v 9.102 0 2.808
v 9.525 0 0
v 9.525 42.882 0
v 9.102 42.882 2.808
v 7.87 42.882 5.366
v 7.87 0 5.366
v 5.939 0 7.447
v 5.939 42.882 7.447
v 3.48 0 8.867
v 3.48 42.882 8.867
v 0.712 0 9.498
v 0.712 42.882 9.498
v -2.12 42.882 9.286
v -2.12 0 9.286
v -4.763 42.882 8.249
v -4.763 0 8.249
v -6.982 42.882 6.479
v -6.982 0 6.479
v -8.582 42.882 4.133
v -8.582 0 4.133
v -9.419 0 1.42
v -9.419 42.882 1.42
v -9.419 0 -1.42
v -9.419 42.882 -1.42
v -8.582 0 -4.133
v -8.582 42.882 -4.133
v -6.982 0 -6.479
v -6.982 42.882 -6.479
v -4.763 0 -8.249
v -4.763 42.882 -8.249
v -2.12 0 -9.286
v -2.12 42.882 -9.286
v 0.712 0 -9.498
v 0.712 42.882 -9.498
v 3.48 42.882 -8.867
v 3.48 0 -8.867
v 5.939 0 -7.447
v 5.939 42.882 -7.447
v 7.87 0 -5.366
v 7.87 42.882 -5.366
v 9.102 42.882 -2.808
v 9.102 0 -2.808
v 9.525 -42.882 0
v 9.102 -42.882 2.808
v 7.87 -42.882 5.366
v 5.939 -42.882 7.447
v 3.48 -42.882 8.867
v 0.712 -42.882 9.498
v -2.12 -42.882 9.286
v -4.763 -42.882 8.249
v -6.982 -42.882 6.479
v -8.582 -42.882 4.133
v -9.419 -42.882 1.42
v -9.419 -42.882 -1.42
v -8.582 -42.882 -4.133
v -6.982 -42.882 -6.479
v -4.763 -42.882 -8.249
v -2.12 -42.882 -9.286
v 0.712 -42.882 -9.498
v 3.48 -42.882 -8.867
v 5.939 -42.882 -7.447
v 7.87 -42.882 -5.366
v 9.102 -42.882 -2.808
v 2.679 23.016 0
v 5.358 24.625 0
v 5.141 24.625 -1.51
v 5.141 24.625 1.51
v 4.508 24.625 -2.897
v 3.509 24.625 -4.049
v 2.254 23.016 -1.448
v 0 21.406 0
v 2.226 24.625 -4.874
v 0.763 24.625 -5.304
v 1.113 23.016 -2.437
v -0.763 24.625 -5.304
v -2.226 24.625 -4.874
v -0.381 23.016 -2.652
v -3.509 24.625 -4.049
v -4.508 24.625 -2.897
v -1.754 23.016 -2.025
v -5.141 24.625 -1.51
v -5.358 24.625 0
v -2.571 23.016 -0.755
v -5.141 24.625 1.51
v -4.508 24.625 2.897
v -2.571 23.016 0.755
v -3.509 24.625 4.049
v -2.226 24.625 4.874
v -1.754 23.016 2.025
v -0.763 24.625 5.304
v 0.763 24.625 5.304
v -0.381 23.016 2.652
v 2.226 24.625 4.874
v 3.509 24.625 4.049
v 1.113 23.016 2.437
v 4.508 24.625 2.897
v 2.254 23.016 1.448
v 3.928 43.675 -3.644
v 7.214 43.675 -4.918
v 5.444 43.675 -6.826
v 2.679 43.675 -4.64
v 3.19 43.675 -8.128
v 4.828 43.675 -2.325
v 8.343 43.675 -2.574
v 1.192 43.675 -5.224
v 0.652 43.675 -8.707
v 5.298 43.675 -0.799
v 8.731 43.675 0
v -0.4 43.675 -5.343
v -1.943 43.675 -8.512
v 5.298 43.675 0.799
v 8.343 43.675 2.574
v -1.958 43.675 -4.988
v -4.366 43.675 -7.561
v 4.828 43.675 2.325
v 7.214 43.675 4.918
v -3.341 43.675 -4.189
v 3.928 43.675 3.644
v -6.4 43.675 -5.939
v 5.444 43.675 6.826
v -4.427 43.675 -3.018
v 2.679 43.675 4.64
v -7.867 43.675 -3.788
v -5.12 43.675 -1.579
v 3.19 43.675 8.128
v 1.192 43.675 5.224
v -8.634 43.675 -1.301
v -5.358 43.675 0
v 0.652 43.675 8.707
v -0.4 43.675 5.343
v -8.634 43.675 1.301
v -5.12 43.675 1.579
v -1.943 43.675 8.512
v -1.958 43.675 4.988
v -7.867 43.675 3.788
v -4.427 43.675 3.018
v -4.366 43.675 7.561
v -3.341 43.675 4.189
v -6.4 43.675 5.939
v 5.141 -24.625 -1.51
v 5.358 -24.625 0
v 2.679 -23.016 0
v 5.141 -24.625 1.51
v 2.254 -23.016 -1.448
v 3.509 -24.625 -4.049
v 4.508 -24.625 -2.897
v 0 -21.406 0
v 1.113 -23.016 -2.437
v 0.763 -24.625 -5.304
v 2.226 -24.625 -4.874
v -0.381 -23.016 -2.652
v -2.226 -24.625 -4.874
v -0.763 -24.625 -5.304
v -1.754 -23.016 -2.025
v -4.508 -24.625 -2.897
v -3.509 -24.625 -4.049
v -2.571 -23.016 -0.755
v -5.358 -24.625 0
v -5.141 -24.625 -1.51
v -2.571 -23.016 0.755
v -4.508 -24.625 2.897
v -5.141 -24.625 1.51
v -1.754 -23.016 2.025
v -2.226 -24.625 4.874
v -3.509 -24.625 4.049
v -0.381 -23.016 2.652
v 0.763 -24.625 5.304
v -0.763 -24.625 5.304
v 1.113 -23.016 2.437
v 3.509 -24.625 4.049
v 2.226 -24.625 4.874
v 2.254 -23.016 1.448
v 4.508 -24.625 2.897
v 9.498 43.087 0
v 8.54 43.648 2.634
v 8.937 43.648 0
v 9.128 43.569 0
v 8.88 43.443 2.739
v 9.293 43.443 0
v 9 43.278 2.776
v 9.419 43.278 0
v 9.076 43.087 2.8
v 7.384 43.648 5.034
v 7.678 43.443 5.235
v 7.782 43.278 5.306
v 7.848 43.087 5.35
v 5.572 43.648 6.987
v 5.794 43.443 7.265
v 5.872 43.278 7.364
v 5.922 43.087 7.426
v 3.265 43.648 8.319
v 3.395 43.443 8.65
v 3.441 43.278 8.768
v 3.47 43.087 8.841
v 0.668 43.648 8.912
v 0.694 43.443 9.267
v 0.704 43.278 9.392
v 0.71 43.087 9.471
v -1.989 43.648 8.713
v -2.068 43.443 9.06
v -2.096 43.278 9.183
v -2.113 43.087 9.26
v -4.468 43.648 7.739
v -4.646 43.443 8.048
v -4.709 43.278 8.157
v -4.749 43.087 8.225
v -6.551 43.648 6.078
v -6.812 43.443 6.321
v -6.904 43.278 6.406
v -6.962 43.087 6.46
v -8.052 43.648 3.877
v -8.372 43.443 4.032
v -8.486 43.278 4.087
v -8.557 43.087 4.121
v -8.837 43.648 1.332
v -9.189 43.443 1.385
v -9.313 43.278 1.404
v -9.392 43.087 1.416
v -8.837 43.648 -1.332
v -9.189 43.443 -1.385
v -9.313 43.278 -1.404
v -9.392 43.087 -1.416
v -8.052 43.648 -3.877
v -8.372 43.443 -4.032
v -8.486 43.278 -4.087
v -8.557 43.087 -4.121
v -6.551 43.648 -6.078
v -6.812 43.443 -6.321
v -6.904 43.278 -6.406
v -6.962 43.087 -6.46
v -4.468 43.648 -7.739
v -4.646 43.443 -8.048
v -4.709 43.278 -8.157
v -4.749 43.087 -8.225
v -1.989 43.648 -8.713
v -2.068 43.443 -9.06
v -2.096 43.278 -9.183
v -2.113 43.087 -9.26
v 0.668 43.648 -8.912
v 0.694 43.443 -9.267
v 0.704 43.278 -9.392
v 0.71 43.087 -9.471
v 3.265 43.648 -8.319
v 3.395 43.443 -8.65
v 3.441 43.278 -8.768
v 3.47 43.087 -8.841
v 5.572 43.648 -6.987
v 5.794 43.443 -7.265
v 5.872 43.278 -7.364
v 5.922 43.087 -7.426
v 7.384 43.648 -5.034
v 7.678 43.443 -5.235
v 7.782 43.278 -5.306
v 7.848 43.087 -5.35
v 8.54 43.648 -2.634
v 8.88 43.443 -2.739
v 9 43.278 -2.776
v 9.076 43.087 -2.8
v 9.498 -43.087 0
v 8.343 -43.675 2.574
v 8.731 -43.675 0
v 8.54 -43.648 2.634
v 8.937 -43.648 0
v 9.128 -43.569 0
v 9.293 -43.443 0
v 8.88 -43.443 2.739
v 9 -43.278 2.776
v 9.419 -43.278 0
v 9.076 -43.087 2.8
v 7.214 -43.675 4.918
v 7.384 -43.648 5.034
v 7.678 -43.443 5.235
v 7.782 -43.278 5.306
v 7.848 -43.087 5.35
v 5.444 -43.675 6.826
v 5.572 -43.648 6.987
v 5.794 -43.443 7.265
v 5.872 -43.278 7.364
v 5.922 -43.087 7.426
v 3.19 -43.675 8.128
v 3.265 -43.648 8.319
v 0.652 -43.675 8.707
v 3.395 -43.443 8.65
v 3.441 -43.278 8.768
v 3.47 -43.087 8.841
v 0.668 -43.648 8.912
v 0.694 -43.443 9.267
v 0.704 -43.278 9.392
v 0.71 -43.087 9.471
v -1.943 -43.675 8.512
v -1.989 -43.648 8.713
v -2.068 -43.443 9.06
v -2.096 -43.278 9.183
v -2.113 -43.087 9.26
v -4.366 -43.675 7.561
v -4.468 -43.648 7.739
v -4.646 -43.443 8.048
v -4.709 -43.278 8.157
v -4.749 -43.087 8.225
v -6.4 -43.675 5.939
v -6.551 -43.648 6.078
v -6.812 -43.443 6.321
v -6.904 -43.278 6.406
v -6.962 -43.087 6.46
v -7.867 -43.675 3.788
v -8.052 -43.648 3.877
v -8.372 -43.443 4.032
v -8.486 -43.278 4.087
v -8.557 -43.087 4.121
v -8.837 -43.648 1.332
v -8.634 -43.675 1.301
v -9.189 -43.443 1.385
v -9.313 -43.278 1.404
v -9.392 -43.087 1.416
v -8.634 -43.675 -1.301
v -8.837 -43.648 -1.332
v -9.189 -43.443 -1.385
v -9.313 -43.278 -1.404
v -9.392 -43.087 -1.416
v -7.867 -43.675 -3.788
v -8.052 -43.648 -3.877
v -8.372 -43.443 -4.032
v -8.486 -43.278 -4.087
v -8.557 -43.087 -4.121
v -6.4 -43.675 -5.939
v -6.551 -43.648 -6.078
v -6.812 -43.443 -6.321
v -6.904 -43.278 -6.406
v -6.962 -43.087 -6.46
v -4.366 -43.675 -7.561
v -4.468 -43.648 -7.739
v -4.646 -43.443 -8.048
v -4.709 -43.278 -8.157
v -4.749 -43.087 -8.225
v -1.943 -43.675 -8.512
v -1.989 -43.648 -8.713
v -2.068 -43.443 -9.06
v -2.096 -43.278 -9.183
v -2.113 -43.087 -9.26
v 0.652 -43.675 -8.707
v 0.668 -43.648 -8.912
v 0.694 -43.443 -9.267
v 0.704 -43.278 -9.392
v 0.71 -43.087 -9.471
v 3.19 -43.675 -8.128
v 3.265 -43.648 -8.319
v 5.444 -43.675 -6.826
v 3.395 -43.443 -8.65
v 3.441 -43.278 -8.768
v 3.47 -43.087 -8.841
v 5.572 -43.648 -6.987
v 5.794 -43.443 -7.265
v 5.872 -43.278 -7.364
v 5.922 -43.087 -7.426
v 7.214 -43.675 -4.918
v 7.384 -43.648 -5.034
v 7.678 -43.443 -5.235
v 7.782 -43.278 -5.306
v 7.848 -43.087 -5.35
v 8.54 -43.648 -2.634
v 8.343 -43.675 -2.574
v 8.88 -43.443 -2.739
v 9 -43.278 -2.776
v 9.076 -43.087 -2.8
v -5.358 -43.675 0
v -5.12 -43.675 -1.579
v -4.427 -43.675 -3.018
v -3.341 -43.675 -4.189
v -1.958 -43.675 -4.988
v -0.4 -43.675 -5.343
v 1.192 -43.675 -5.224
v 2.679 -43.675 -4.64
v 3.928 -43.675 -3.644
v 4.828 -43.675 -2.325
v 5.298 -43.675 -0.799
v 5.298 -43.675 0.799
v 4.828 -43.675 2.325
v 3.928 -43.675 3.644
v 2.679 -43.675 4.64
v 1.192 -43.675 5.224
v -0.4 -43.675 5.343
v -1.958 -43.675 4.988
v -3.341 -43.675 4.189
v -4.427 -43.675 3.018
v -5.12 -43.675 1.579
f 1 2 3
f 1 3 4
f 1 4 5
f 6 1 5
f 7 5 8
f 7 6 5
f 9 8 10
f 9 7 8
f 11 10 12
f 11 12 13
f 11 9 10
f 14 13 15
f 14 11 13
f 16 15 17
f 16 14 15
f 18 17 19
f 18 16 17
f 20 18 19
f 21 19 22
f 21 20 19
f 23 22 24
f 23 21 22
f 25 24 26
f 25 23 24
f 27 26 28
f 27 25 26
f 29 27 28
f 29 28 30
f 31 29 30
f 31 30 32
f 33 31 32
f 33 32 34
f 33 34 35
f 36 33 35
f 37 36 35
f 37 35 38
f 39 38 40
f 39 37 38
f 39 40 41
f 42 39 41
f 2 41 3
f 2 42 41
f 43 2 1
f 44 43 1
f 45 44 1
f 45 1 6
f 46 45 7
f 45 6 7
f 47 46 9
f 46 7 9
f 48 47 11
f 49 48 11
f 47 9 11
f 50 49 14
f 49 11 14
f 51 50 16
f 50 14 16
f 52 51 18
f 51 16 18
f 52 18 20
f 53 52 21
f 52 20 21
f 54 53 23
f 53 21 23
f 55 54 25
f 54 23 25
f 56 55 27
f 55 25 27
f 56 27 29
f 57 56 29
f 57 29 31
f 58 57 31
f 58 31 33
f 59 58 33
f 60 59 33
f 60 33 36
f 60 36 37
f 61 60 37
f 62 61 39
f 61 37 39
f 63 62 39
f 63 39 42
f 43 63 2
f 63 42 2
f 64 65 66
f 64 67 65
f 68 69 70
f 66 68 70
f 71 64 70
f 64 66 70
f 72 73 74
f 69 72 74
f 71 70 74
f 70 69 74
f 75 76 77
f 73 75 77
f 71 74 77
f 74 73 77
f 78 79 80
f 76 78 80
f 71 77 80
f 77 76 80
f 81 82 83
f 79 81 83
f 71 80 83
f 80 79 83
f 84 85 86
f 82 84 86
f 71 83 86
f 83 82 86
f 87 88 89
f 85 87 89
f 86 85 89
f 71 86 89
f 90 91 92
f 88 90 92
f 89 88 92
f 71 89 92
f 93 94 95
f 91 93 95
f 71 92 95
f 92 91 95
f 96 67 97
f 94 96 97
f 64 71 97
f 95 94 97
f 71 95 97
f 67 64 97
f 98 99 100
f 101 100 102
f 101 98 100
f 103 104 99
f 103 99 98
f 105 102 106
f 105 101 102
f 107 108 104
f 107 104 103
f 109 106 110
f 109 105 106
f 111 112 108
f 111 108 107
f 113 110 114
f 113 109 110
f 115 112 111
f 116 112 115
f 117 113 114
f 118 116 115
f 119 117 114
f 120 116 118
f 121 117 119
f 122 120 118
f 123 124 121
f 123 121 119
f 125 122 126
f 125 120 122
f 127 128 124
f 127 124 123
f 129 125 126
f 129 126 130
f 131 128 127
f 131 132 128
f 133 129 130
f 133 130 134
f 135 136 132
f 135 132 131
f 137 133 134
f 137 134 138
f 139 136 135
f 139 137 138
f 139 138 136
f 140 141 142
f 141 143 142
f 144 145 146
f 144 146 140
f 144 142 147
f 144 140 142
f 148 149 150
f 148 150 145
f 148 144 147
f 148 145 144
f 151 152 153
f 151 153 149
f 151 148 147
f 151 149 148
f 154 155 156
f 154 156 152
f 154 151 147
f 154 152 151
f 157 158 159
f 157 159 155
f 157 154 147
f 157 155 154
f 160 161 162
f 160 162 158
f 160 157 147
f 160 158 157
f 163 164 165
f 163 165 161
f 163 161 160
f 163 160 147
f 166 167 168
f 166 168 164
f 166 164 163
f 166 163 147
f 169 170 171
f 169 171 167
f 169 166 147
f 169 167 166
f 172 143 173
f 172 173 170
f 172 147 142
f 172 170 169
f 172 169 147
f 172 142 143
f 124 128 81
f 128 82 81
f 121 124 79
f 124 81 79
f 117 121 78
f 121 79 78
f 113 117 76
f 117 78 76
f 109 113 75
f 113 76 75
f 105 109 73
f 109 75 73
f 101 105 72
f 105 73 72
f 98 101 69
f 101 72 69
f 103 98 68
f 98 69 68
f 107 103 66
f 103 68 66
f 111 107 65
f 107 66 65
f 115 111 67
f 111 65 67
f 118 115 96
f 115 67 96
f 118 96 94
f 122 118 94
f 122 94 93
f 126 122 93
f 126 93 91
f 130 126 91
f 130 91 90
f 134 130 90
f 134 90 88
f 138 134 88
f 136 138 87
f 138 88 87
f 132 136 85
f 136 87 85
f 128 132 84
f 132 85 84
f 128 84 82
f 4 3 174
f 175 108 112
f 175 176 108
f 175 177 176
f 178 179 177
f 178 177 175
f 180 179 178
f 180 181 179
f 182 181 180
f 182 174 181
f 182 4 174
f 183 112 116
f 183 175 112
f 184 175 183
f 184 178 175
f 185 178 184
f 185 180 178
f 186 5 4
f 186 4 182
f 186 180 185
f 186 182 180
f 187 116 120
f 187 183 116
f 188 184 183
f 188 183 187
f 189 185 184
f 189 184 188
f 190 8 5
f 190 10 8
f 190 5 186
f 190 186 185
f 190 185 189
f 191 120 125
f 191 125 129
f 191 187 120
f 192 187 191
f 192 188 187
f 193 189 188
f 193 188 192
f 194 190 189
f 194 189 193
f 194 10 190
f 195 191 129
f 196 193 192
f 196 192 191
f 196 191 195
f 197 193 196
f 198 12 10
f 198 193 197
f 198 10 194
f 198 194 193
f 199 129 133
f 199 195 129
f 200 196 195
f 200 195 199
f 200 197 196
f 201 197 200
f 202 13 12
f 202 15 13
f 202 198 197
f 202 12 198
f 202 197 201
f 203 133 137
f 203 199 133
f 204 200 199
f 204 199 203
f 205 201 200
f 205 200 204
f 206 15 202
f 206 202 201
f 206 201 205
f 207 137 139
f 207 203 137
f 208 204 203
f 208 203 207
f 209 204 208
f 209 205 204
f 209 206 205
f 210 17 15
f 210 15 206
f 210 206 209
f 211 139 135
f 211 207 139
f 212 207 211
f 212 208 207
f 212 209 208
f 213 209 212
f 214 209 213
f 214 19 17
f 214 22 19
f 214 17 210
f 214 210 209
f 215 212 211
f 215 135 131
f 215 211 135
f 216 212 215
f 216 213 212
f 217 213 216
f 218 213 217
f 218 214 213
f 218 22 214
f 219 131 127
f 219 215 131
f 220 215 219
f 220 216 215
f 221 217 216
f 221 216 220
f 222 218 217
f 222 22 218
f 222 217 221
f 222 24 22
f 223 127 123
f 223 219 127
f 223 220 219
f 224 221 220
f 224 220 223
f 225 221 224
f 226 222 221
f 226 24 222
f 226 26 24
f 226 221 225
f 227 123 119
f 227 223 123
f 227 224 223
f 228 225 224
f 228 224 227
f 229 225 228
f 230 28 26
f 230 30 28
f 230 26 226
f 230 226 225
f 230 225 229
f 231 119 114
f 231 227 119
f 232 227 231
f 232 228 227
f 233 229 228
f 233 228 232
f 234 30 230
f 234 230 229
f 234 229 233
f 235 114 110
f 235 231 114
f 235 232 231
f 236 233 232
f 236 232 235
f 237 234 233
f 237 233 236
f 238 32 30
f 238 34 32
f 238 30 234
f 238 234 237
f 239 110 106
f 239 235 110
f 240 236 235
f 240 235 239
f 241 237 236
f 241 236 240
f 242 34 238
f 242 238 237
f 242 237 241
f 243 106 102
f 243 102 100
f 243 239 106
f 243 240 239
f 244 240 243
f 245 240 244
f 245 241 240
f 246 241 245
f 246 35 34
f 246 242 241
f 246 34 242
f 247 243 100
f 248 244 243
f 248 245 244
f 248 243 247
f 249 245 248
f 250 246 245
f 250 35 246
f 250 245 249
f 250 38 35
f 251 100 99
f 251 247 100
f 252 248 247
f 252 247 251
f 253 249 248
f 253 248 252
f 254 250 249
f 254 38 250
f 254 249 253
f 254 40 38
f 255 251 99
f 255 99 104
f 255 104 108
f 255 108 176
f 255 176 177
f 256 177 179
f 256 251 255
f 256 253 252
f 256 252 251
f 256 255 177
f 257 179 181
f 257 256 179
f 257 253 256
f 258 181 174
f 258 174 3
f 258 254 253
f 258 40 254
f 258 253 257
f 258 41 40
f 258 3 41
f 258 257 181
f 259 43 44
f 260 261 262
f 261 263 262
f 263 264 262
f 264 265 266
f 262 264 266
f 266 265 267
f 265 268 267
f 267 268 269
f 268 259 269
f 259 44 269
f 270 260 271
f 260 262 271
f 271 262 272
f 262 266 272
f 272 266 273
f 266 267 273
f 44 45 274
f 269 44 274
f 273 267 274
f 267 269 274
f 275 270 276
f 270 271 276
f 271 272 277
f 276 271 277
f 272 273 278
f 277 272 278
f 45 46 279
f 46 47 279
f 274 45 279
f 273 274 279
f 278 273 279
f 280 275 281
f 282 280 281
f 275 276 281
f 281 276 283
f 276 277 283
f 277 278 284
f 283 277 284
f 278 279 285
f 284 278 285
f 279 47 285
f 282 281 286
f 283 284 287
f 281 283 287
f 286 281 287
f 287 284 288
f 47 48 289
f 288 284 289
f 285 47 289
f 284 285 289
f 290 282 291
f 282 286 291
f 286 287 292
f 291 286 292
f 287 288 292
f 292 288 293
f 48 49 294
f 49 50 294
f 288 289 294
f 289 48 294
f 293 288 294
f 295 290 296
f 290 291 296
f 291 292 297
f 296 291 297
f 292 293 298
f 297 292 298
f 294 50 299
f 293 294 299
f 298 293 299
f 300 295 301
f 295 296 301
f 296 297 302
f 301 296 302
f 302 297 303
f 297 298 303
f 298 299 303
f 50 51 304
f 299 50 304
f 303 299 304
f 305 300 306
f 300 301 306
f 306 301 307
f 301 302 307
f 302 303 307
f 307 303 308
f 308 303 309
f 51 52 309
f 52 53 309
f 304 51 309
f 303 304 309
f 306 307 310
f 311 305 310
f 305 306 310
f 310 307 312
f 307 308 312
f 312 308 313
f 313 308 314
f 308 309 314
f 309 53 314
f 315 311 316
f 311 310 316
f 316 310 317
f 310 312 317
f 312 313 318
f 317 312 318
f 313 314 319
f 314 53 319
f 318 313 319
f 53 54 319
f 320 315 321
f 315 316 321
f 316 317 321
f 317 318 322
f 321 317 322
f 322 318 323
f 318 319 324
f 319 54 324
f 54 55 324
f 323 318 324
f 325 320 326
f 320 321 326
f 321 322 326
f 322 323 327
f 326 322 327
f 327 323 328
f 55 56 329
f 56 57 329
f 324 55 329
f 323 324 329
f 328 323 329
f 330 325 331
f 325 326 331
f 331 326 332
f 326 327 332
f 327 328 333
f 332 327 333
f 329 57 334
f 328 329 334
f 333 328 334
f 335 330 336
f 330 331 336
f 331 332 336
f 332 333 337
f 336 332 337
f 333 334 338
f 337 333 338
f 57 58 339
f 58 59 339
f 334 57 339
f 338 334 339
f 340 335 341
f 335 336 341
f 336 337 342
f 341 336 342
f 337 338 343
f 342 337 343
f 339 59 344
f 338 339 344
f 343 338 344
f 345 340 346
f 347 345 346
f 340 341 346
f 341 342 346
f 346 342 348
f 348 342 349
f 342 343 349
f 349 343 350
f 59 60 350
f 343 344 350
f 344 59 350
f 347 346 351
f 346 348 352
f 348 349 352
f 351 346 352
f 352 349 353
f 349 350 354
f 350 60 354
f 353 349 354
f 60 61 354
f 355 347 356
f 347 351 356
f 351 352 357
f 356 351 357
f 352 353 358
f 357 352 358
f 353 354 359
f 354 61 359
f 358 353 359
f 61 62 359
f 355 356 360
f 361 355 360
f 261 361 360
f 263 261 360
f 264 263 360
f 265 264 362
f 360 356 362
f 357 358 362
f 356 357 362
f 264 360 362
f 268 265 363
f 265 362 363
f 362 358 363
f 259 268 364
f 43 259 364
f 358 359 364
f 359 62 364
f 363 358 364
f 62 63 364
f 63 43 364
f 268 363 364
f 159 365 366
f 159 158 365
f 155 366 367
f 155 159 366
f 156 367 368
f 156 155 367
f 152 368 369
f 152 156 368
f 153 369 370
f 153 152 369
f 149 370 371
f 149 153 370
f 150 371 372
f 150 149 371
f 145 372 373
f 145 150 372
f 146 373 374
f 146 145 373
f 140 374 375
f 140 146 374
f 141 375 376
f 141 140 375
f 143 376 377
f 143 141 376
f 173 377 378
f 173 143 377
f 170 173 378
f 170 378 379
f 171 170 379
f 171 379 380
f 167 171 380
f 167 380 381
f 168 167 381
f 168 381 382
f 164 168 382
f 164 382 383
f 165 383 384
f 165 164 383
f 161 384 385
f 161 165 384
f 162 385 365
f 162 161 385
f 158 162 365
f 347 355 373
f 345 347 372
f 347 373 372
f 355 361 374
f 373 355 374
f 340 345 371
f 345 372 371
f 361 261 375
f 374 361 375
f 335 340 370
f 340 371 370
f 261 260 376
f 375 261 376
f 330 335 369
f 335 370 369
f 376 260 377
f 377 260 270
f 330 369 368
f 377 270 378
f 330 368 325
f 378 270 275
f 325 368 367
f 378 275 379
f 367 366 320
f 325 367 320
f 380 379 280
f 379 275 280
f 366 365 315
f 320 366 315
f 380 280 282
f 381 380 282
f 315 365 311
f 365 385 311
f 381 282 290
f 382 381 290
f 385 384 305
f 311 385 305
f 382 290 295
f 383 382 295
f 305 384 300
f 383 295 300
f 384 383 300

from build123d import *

# Parameters (mm, degrees)
F_1_2_13_TAPPED_HOLE1_D     = 10.71626
F_1_2_13_TAPPED_HOLE1_DEPTH = 19.05
F_1_2_13_TAPPED_HOLE1_TIP   = 3.219489309


with BuildPart() as part:
    # Sketch1 → Revolve1 (revolve)
    with BuildSketch(Plane.XY):
        with BuildLine():
            Line((0, 0), (0, 43.6753))
            Line((0, 43.6753), (8.73125, 43.6753))
            ThreePointArc((8.73125, 43.6753), (9.292516008, 43.442816008), (9.525, 42.88155))
            Line((9.525, 42.88155), (9.525, 0.79375))
            Line((9.525, 0.79375), (9.525, 0))
            Line((9.525, 0), (0, 0))
        make_face()
    revolve(axis=Axis((0, 288.392157732, 0), (0, -1, 0)))

    # 1/2-13 Tapped Hole1
    with Locations(Plane(origin=(0, 43.6753, 0), x_dir=(1, 0, 0), z_dir=(0, 1, 0))):
        with Locations((0, 0)):
            Hole(F_1_2_13_TAPPED_HOLE1_D / 2, depth=F_1_2_13_TAPPED_HOLE1_DEPTH)
            with Locations((0, 0, -(F_1_2_13_TAPPED_HOLE1_DEPTH + F_1_2_13_TAPPED_HOLE1_TIP / 2))):  # 118° drill point
                Cone(0, F_1_2_13_TAPPED_HOLE1_D / 2, F_1_2_13_TAPPED_HOLE1_TIP, mode=Mode.SUBTRACT)

    # Mirror1: part across plane


with BuildPart() as part_1:
    add(part.part)
    add(part.part.mirror(Plane.ZX))


solid = part_1.part
